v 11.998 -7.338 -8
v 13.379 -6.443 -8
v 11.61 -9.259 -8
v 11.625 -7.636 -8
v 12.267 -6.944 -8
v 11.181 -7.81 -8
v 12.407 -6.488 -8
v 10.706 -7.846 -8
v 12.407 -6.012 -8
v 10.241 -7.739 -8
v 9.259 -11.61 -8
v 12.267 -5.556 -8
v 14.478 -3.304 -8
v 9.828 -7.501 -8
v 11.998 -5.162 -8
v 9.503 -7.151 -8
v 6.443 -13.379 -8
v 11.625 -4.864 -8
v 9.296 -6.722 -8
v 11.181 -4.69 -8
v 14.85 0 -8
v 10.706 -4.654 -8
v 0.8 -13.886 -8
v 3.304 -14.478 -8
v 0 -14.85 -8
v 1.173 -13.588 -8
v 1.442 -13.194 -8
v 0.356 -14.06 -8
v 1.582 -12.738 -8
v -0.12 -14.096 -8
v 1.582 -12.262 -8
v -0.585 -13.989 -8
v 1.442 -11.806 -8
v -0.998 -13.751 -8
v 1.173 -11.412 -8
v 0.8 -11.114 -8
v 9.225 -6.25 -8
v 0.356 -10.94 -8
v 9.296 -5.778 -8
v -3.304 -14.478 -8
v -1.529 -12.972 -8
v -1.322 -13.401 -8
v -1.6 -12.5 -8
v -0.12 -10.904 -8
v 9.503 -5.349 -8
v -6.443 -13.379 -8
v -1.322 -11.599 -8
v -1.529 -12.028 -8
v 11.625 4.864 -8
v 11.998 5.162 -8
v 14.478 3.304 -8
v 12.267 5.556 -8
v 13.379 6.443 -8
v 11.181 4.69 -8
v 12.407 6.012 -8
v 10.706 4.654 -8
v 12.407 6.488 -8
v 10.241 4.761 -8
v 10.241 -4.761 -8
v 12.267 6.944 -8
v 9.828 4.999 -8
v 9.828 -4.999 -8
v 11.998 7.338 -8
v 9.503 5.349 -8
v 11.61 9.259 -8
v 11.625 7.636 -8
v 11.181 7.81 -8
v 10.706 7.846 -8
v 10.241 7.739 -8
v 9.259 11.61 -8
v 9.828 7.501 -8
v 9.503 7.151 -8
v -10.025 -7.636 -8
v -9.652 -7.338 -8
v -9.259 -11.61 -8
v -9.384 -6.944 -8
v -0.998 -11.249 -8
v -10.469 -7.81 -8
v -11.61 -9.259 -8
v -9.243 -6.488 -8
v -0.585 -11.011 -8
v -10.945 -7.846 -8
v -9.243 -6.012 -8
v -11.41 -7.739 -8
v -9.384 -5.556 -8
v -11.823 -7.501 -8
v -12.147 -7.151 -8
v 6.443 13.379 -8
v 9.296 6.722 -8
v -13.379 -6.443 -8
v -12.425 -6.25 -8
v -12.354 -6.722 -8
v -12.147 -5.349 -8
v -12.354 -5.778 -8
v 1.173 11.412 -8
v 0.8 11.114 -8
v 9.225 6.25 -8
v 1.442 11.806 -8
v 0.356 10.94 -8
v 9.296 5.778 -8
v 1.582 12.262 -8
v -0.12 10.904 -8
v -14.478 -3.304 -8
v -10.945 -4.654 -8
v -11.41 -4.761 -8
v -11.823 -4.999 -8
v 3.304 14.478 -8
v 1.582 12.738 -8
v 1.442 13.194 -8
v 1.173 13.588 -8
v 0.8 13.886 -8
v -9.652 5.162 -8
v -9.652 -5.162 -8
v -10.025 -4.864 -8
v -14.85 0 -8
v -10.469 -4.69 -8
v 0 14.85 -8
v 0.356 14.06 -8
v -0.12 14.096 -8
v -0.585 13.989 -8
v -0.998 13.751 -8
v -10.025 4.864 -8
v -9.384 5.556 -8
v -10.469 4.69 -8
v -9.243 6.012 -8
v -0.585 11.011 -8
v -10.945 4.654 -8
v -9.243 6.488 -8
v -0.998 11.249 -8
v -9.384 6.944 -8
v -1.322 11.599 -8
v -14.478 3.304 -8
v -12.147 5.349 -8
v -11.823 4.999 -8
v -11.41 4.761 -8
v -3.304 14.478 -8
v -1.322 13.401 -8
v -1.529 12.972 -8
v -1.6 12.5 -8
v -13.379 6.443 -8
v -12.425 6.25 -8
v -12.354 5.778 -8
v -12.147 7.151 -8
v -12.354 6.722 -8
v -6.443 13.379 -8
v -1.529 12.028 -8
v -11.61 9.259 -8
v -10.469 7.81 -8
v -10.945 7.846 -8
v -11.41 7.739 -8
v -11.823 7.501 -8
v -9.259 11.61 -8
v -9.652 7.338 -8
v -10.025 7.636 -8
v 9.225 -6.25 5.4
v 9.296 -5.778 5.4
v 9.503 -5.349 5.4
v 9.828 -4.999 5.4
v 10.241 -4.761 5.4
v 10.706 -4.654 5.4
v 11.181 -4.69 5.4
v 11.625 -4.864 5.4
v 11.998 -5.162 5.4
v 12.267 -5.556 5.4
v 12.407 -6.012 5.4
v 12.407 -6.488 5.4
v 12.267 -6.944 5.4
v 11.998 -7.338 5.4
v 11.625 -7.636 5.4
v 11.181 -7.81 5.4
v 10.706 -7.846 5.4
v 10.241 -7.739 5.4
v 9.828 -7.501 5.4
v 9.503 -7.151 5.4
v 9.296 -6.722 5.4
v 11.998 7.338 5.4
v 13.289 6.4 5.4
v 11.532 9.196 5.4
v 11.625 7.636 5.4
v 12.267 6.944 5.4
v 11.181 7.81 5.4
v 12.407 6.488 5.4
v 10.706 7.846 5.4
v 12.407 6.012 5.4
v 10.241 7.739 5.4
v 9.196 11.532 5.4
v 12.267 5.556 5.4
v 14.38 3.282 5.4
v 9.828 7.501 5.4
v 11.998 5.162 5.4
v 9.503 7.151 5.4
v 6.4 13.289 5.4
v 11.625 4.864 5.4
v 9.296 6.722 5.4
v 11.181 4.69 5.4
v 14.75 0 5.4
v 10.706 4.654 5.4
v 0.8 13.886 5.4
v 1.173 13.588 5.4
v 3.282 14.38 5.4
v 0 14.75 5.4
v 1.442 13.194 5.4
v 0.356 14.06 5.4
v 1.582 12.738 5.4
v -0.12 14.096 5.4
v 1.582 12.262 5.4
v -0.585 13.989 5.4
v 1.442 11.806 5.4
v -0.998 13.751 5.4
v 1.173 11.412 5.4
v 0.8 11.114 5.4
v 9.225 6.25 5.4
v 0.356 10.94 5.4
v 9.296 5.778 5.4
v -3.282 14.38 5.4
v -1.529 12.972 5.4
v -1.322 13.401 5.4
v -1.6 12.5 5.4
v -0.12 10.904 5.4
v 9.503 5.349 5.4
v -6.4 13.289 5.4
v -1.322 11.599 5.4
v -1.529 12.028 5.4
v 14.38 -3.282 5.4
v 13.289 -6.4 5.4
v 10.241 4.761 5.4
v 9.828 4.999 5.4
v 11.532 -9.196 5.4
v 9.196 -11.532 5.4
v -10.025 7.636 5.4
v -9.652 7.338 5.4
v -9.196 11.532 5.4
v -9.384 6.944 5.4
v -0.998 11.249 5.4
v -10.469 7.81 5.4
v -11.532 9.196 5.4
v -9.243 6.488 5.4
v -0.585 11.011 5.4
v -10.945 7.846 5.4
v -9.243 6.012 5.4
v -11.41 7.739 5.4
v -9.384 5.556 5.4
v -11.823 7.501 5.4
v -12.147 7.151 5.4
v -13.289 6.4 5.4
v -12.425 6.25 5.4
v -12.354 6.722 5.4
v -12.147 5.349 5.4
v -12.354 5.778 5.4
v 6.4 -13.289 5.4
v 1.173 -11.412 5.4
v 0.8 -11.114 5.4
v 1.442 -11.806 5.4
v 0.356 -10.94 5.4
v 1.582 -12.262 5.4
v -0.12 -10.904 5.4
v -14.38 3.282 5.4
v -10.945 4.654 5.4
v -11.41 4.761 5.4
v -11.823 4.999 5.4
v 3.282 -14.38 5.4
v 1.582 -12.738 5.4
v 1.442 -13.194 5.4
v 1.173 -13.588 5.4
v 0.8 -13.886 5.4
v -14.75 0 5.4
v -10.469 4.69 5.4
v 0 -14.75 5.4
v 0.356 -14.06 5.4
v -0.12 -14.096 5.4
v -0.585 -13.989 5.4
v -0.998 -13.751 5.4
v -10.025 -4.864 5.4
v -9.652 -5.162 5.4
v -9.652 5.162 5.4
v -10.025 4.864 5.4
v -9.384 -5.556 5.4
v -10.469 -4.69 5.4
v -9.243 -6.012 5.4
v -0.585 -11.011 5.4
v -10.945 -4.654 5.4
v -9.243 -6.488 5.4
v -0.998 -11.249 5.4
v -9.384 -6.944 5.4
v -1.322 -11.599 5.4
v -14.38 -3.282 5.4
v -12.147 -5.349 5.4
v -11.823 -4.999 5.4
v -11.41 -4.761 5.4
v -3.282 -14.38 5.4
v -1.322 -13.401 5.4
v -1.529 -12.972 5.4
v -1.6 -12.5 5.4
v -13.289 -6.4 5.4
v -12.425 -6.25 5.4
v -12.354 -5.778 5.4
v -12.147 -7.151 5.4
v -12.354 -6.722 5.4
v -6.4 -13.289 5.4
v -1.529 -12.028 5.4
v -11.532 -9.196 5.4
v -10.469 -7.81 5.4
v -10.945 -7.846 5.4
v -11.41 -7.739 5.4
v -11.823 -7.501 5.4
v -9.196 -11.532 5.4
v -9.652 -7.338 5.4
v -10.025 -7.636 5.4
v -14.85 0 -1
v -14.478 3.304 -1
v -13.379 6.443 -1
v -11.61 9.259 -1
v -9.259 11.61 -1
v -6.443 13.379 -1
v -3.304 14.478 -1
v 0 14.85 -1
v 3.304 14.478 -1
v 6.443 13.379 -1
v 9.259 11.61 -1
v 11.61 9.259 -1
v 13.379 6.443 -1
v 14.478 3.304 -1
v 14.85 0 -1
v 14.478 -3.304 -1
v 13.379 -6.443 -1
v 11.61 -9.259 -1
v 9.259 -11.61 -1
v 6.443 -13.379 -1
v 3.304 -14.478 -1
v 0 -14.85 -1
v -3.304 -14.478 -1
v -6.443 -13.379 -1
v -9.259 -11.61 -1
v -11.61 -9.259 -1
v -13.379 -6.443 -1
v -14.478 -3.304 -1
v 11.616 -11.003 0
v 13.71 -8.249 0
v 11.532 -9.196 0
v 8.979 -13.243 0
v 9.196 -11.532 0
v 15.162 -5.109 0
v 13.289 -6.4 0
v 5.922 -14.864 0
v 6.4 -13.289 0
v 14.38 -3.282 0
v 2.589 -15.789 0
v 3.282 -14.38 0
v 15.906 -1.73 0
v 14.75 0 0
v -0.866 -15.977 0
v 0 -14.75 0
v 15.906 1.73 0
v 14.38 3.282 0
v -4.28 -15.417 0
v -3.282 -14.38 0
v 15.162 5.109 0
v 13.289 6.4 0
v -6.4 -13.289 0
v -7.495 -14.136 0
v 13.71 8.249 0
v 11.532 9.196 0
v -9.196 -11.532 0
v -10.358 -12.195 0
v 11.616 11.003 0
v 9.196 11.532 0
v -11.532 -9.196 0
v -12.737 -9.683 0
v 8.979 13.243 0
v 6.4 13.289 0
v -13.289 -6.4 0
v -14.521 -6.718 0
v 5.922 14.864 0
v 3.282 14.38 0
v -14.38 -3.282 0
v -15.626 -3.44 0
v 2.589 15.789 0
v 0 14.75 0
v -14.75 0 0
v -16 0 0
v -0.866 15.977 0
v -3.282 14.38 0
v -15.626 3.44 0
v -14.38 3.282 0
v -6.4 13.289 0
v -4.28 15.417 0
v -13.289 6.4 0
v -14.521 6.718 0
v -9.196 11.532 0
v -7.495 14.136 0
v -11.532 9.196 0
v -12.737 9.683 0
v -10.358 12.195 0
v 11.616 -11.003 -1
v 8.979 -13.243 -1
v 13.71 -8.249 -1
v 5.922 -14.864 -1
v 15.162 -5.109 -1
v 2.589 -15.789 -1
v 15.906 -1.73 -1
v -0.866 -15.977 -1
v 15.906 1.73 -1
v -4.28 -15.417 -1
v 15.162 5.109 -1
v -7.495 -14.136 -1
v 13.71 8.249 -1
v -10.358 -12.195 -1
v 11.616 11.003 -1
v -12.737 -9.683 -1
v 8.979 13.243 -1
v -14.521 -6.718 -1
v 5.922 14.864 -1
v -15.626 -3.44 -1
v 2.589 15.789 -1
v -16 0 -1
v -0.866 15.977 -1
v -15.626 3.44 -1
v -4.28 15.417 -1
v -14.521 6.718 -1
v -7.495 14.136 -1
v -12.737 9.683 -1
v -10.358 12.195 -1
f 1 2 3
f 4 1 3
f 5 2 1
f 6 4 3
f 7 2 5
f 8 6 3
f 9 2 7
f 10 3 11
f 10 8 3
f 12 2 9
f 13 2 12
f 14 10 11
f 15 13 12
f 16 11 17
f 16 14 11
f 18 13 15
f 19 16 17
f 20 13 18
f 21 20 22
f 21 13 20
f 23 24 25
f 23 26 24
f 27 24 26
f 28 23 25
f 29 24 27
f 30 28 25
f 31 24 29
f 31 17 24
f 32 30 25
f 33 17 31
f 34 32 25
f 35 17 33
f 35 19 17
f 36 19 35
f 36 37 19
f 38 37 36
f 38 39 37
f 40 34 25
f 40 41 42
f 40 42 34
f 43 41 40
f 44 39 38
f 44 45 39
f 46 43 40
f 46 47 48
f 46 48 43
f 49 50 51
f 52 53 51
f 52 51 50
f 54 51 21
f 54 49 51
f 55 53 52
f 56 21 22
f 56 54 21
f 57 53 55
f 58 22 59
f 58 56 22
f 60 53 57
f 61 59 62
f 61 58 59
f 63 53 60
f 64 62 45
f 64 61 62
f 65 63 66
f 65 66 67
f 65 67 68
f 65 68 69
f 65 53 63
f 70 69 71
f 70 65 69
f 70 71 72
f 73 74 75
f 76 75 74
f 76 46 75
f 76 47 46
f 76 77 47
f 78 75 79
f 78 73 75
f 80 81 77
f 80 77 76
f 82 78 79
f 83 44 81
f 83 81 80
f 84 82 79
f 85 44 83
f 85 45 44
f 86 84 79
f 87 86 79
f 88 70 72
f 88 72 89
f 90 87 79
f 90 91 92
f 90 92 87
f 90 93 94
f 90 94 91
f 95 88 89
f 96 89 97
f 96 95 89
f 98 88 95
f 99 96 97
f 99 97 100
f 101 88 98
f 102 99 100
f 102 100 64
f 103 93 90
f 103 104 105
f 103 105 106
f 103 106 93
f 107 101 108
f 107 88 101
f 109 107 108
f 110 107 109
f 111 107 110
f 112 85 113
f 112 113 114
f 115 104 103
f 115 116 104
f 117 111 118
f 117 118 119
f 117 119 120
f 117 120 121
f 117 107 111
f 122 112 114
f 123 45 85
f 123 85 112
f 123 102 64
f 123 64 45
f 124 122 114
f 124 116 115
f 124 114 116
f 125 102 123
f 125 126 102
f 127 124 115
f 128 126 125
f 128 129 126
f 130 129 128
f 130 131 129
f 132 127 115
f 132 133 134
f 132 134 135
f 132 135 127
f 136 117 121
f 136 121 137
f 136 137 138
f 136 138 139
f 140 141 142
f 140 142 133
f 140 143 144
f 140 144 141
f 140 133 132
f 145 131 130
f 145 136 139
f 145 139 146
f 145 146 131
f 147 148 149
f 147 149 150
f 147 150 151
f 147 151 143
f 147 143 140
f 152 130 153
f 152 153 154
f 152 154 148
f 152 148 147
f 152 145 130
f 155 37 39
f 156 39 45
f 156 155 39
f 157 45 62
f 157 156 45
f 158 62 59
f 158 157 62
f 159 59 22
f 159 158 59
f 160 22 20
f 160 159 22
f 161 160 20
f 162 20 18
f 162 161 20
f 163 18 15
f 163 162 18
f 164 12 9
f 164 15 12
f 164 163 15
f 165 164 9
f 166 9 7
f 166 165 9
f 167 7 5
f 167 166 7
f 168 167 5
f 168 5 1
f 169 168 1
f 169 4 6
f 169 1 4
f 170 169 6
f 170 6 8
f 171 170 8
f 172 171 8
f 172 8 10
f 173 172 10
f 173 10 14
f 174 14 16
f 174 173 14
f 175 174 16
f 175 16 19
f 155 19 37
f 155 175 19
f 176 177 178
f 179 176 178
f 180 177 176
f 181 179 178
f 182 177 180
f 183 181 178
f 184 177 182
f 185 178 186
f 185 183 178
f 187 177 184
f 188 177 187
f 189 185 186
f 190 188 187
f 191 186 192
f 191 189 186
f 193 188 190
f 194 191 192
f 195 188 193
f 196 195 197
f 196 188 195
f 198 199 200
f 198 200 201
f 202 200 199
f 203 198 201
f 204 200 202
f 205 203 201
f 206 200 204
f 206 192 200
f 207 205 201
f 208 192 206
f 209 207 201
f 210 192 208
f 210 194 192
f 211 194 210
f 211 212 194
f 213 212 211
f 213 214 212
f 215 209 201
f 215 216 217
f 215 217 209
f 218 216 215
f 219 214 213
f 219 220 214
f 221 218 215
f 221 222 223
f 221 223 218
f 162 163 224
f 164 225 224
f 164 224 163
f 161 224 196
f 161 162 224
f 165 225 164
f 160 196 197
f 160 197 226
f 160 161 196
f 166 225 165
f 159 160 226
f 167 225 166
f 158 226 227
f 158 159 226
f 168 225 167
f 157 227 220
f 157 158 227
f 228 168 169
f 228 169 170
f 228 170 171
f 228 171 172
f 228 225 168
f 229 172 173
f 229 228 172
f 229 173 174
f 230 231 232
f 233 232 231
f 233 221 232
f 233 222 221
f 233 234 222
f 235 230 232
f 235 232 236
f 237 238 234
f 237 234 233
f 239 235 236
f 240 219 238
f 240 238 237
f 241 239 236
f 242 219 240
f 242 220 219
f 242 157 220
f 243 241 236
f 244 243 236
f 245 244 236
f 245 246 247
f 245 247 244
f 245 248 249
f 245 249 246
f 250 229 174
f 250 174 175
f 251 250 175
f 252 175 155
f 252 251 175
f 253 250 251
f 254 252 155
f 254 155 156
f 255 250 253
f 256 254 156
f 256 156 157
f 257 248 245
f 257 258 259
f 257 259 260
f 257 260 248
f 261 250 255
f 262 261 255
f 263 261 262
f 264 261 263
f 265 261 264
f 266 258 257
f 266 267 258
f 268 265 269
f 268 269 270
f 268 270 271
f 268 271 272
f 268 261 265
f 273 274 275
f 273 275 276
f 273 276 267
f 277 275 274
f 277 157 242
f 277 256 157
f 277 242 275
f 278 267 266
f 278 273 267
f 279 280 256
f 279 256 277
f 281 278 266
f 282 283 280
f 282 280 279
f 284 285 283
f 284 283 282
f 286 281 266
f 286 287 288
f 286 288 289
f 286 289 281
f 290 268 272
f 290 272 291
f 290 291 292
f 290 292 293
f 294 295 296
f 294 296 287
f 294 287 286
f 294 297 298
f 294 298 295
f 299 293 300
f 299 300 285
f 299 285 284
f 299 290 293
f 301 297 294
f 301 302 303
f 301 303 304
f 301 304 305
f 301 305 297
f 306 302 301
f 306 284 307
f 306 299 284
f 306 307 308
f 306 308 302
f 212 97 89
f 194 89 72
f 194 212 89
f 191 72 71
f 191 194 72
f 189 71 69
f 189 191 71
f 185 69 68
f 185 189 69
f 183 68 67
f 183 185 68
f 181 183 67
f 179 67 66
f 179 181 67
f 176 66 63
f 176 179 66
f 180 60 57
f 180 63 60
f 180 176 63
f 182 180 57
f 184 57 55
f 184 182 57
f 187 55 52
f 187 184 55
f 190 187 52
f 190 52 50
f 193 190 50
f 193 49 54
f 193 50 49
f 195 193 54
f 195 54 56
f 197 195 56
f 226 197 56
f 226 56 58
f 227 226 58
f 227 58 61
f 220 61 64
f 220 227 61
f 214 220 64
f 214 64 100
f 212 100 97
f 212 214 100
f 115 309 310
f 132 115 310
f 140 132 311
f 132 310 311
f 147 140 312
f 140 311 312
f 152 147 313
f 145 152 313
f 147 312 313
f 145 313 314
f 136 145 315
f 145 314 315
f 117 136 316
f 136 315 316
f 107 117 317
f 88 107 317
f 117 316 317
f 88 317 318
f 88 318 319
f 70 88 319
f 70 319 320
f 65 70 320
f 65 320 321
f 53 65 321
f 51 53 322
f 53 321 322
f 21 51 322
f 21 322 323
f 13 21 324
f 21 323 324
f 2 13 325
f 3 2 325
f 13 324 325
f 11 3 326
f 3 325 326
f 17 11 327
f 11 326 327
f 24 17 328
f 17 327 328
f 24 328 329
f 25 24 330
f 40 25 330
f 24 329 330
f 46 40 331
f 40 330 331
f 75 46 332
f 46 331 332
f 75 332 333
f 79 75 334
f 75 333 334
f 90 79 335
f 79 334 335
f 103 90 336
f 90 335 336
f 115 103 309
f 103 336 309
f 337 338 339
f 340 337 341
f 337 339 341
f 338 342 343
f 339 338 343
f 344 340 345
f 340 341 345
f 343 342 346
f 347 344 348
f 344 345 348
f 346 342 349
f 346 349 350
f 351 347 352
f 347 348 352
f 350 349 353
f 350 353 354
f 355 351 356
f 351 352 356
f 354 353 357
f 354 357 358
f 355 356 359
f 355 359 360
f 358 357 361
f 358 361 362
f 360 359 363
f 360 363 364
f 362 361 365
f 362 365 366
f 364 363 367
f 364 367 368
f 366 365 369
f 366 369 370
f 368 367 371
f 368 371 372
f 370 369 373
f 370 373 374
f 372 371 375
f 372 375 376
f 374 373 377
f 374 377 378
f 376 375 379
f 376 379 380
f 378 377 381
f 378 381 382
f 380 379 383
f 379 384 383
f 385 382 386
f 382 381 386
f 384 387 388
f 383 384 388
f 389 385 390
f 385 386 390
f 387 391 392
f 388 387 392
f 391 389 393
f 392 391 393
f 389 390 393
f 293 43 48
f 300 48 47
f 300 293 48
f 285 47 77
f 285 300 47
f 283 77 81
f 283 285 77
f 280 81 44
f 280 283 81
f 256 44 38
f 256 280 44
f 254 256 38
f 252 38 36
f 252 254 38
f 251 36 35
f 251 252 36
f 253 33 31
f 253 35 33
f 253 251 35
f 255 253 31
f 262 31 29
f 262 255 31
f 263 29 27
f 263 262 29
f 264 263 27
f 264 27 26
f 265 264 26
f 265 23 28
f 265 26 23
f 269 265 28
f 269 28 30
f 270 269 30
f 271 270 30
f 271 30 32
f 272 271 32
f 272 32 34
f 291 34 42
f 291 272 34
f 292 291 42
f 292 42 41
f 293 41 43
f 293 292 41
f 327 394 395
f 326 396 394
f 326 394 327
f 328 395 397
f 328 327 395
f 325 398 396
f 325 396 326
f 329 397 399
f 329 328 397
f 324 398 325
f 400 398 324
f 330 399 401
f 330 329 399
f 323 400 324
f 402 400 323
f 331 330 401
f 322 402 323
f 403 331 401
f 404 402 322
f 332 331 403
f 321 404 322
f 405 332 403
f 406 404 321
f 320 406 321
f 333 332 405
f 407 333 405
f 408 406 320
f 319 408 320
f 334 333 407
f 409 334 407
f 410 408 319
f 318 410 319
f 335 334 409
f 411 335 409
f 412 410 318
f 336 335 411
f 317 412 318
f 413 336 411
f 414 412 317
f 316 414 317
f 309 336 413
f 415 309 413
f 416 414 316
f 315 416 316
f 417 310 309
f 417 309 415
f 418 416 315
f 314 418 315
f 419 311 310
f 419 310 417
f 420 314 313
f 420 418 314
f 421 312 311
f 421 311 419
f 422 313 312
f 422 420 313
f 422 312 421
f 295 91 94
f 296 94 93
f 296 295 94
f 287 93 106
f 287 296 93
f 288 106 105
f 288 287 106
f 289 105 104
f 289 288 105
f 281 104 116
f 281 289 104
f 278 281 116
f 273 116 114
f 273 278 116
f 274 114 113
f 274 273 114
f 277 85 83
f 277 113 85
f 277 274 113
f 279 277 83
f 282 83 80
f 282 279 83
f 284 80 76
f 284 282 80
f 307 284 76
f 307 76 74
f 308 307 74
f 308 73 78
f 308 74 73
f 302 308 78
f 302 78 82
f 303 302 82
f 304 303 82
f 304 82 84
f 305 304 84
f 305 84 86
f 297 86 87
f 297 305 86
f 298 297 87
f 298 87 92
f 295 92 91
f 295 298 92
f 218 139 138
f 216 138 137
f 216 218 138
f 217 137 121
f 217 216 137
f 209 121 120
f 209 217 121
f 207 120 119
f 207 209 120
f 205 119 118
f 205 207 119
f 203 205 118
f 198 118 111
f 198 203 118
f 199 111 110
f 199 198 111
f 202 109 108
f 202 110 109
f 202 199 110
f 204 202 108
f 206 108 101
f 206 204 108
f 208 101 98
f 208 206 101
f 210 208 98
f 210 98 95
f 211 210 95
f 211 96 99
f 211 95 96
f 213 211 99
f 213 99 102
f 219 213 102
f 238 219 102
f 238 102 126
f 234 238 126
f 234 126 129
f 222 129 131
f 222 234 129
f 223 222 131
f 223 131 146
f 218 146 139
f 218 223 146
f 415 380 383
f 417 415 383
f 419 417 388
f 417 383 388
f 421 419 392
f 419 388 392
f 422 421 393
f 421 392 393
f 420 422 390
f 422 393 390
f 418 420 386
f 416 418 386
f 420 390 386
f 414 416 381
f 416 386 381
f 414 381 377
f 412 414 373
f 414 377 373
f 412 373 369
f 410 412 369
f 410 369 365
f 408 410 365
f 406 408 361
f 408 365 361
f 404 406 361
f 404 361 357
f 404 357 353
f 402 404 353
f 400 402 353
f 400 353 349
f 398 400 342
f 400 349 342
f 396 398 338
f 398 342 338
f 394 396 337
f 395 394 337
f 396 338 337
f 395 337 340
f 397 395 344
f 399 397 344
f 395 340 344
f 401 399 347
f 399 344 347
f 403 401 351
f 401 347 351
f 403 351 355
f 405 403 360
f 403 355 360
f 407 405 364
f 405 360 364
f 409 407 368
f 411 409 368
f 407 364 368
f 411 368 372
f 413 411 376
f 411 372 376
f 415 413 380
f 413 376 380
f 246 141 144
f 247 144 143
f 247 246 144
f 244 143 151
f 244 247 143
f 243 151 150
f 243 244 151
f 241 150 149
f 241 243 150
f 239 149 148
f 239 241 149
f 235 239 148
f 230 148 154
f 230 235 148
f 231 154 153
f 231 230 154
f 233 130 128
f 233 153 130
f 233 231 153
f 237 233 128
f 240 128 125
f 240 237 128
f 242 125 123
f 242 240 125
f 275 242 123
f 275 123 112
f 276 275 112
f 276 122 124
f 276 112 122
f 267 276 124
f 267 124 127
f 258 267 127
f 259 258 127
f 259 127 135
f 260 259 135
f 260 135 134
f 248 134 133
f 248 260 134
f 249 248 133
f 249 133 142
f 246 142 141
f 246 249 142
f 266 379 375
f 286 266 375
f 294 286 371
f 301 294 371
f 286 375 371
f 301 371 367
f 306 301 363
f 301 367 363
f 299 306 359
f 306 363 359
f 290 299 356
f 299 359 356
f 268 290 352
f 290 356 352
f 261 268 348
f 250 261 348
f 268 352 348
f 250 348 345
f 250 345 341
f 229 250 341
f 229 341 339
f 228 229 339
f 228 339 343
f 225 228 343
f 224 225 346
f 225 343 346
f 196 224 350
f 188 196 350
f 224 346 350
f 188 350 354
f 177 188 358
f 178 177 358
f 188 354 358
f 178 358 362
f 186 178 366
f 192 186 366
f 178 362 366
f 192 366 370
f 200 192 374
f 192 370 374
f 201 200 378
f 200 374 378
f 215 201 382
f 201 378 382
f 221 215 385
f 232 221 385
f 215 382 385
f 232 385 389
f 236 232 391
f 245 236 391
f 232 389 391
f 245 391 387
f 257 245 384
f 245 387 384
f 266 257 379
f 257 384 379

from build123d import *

# Parameters (mm, degrees)
SKETCH_1_R          = 14.75
EXTRUDE_1_DEPTH     = 5.4
SKETCH_3_R          = 16
EXTRUDE_2_DEPTH     = 1
SKETCH_4_R          = 14.85
EXTRUDE_3_DEPTH     = 7
SKETCH_2_R          = 1.6
CUT_EXTRUDE_2_DEPTH = 27.297528401


with BuildPart() as part:
    # 草图1 → 凸台-拉伸1 (new body)
    with BuildSketch(Plane.XY):
        with Locations(Location((0, 0, 0), (0, 0, 180))):
            Circle(SKETCH_1_R)
    extrude(amount=EXTRUDE_1_DEPTH)

    # 草图3 → 凸台-拉伸2 (add)
    with BuildSketch(Plane(origin=(0, 0, 0), x_dir=(-1, 0, 0), z_dir=(0, 0, -1))):
        Circle(SKETCH_3_R)
    extrude(amount=EXTRUDE_2_DEPTH)

    # 草图4 → 凸台-拉伸3 (add)
    with BuildSketch(Plane(origin=(0, 0, -1), x_dir=(-1, 0, 0), z_dir=(0, 0, -1))):
        Circle(SKETCH_4_R)
    extrude(amount=EXTRUDE_3_DEPTH)

    # 草图2 → 切除-拉伸2 (cut, through all)
    with BuildSketch(Plane(origin=(0, 0, 5.4), x_dir=(-1, 0, 0), z_dir=(0, 0, -1))):
        with Locations((10.825317547, -6.25)):
            Circle(SKETCH_2_R)
        with Locations((-10.825317547, 6.25)):
            Circle(SKETCH_2_R)
        with Locations((-10.825317547, -6.25)):
            Circle(SKETCH_2_R)
        with Locations((0, -12.5)):
            Circle(SKETCH_2_R)
        with Locations((10.825317547, 6.25)):
            Circle(SKETCH_2_R)
        with Locations((0, 12.5)):
            Circle(SKETCH_2_R)
    extrude(amount=CUT_EXTRUDE_2_DEPTH, mode=Mode.SUBTRACT)


solid = part.part
